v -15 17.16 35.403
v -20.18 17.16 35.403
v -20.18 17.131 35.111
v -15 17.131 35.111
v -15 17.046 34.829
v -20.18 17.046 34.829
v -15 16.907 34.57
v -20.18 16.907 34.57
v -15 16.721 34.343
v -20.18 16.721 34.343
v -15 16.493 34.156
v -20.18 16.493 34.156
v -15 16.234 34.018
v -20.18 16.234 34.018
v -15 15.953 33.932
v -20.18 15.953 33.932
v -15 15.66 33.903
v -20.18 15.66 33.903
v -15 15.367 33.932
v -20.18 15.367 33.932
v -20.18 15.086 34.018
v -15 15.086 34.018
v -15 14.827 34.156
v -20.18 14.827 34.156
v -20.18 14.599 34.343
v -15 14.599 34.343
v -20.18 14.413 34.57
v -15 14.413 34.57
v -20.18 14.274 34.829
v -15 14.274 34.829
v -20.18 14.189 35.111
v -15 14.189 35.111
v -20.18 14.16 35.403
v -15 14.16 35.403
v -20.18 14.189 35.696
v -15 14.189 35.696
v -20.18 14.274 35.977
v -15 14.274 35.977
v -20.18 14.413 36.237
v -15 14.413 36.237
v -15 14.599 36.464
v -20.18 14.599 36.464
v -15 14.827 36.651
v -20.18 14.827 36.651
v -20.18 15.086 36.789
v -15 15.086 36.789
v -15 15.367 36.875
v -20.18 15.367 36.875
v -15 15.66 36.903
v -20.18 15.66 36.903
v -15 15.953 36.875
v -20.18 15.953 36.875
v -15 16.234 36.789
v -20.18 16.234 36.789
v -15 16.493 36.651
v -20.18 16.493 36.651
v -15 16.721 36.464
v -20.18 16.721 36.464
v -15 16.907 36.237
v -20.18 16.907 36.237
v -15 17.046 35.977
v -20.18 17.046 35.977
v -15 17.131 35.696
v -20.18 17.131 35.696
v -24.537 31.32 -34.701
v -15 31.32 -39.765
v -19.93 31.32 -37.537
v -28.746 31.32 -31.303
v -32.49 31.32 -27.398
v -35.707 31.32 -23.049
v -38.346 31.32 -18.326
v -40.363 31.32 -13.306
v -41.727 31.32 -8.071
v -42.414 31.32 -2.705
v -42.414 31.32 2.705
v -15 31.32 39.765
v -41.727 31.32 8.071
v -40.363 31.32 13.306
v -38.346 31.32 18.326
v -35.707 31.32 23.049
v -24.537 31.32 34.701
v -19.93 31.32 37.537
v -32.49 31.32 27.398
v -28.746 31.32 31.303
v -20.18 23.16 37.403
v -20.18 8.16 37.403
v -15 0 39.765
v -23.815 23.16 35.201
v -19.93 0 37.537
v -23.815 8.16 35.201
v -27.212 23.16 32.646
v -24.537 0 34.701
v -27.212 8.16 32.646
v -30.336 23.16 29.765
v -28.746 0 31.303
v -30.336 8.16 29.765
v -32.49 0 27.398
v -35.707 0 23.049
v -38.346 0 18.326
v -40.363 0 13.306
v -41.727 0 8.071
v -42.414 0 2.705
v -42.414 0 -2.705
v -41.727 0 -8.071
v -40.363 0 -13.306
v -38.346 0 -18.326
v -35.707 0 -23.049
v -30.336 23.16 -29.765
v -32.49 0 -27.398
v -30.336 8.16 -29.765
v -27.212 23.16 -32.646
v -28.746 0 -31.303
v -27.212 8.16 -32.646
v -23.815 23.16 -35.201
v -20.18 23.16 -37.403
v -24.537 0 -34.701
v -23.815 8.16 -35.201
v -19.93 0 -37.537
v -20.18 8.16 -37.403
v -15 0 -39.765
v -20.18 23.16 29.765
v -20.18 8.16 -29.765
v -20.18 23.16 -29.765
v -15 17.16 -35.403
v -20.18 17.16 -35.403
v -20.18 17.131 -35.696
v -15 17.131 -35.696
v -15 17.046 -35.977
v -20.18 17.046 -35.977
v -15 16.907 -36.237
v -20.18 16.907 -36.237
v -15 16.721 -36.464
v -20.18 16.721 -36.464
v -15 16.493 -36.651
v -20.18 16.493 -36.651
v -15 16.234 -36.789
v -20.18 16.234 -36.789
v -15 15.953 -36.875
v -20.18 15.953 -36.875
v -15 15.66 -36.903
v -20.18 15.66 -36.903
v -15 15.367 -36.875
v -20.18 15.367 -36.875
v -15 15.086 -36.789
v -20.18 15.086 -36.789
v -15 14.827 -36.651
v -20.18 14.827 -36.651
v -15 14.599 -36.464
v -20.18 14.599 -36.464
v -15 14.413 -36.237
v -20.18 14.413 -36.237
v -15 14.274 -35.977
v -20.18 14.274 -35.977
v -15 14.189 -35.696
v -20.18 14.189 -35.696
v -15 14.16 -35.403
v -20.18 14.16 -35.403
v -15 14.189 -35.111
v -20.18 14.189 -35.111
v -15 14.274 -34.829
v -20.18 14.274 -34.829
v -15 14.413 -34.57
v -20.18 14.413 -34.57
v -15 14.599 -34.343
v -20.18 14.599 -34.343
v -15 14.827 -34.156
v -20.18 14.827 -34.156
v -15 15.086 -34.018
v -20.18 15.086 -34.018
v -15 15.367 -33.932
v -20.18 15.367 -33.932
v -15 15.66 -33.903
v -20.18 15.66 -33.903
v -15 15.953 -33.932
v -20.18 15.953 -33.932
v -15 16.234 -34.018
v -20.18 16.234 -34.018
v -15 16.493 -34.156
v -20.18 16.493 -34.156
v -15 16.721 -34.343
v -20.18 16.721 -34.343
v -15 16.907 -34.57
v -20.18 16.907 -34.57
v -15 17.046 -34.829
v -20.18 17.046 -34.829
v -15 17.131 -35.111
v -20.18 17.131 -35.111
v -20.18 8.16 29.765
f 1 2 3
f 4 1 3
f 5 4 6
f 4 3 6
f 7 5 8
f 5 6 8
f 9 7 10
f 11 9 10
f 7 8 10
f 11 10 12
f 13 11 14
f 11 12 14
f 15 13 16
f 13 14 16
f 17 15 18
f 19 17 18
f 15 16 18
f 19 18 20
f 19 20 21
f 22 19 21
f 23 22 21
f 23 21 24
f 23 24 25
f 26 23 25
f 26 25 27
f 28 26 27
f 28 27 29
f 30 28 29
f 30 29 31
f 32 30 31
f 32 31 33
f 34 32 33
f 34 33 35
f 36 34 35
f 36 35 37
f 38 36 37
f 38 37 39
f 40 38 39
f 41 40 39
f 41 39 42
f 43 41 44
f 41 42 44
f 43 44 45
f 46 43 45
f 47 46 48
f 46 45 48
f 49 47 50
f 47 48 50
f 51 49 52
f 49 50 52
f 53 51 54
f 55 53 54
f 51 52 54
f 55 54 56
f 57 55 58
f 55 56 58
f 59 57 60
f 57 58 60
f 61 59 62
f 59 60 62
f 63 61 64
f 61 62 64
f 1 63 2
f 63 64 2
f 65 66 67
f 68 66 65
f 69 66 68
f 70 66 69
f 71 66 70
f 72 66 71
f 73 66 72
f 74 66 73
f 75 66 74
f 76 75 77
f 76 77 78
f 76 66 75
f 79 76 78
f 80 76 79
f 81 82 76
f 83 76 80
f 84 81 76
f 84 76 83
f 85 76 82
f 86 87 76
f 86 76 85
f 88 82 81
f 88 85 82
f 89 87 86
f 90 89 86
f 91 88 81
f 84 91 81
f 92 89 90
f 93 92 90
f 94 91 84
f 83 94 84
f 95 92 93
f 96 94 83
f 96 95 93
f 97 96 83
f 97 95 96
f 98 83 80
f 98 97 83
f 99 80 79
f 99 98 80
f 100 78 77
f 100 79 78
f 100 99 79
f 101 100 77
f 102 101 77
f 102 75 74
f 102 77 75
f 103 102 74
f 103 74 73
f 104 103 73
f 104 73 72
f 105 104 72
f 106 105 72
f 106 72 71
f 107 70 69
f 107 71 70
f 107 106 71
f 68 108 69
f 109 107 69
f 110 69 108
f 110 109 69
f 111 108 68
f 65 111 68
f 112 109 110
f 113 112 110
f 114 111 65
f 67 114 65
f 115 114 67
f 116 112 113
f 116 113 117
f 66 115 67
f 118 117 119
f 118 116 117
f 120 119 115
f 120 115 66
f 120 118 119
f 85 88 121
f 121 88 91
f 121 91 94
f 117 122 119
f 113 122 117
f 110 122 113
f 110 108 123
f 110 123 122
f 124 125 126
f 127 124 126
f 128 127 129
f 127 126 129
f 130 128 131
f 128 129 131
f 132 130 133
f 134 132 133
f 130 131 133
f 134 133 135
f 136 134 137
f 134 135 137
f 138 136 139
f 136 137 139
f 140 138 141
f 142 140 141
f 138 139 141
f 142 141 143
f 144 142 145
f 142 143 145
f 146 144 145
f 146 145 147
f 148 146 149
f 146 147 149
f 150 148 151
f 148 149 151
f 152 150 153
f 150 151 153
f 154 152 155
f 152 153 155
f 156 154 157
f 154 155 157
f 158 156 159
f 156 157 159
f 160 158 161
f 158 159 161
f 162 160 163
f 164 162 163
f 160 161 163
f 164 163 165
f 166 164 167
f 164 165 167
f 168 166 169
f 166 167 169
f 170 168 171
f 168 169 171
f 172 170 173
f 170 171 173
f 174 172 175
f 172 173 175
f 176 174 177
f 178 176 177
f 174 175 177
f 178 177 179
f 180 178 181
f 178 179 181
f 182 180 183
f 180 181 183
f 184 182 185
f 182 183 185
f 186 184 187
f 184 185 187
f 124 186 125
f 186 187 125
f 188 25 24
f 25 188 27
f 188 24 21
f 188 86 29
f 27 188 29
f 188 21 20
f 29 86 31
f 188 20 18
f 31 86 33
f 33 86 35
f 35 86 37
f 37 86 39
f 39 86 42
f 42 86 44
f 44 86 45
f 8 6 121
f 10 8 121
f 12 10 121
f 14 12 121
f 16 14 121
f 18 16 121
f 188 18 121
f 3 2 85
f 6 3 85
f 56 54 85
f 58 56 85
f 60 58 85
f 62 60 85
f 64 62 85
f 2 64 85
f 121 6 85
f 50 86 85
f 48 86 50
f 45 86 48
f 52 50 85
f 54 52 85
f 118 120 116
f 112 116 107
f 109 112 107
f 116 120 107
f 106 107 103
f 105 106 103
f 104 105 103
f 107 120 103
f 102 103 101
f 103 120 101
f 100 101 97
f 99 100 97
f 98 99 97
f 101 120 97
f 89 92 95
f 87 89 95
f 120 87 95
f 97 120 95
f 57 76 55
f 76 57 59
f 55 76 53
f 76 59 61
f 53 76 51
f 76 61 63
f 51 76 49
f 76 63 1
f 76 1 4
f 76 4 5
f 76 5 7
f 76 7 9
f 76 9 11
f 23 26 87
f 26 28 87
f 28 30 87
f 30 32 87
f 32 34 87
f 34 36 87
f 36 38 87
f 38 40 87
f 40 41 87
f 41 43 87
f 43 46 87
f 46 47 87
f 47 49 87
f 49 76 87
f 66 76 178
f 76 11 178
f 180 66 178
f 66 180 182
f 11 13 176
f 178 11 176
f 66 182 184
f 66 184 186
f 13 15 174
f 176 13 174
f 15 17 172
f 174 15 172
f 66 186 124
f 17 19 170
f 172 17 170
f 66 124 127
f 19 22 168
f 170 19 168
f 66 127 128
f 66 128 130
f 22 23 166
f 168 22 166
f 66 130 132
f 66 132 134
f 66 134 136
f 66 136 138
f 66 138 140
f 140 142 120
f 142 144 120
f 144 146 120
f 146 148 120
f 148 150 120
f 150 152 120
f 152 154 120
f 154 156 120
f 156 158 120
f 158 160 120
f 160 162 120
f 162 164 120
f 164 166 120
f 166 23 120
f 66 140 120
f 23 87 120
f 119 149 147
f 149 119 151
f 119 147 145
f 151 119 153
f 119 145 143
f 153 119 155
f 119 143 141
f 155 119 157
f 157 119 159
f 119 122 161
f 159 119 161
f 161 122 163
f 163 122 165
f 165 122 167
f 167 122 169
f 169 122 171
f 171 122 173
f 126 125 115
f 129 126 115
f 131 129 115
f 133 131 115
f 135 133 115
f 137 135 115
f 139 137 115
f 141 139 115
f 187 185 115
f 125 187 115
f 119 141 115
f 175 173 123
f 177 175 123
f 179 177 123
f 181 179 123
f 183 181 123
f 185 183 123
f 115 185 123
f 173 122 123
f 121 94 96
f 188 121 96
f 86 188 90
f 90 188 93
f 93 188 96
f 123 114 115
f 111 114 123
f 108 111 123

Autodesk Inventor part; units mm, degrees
ref_plane "YZ Plane" through (0, 0, 0) normal (1, 0, 0) x (0, 1, 0)
ref_plane "XZ Plane" through (0, 0, 0) normal (0, 1, 0) x (-1, 0, 0)
sketch "Эскиз1" plane through (0, 0, 0) normal (0, 1, 0) x (-1, 0, 0)
  circle A0 centre (0, 0) radius 3.9
  line L0 (-35, -37.5) -> (-35, 37.5)
  line L1 (-35, -37.5) -> (15, -37.5)
  line L2 (15, -37.5) -> (15, -39.7649)
  arc A1 (15, -39.7649) -> (15, 39.7649) centre (0, 0) ccw
  line L3 (15, 39.7649) -> (15, 37.5)
  line L4 (-35, 37.5) -> (15, 37.5)
  line L5 (15, 39.7649) -> (15, -39.7649)
  point P0 (-39, 0)
extrude "Выдавливание1" add sketch "Эскиз1" along normal blind 31.32 contours L5 L3 A1 L2
ref_plane "РабПлоскость1" through (-42.5, 0, 0) normal (1, 0, 0) x (0, 1, 0)
sketch "Эскиз2" plane through (-42.5, 0, 0) normal (1, 0, 0) x (0, 1, 0)
  line L0 (31.32, -39.7649) -> (31.32, 39.7649) projected
  line L1 (31.32, -39.7649) -> (15.66, -39.7649)
  line L2 (0, -39.7649) -> (31.32, -39.7649) projected
  line L3 (15.66, -39.7649) -> (15.66, -34.7649)
  line L4 (8.16, -39.7649) -> (23.16, -39.7649)
  line L5 (23.16, -39.7649) -> (23.16, -29.7649)
  line L6 (23.16, -29.7649) -> (8.16, -29.7649)
  line L7 (8.16, -29.7649) -> (8.16, -39.7649)
  line L8 (8.16, -39.7649) -> (23.16, -29.7649) construction
  line L9 (23.16, -39.7649) -> (8.16, -29.7649) construction
  line L10 (31.32, 0) -> (24.2001, 0)
  line L11 (31.32, 39.7649) -> (15.66, 39.7649)
  line L12 (0, 39.7649) -> (31.32, 39.7649)
  line L13 (15.66, 39.7649) -> (15.66, 34.7649)
  line L14 (8.16, 39.7649) -> (23.16, 39.7649)
  line L15 (23.16, 39.7649) -> (23.16, 29.7649)
  line L16 (23.16, 29.7649) -> (8.16, 29.7649)
  line L17 (8.16, 29.7649) -> (8.16, 39.7649)
  line L18 (8.16, 39.7649) -> (23.16, 29.7649) construction
  line L19 (23.16, 39.7649) -> (8.16, 29.7649) construction
  point P0 (0, 0)
  dimension "d2" = 15.66
  dimension "d3" = 5
  dimension "d4" = 15
  dimension "d5" = 10
extrude "Выдавливание2" cut sketch "Эскиз2" along normal blind 22.32
sketch "Эскиз3" plane through (-42.5, 0, 0) normal (1, 0, 0) x (0, 1, 0)
  line L0 (8.16, -37.4034) -> (23.16, -37.4034) projected
  line L1 (15.66, -37.4034) -> (15.66, -35.4034)
  circle A0 centre (15.66, -35.4034) radius 1.5
  line L2 (23.16, 37.4034) -> (8.16, 37.4034) projected
  line L3 (15.66, 37.4034) -> (15.66, 35.4034)
  circle A1 centre (15.66, 35.4034) radius 1.5
  point P0 (0, 0)
  dimension "d8" = 2
  dimension "d9" = 3
  dimension "d10" = 2
  dimension "d11" = 3
extrude "Выдавливание3" cut sketch "Эскиз3" along normal through all
properties part number "joint3_cap"
